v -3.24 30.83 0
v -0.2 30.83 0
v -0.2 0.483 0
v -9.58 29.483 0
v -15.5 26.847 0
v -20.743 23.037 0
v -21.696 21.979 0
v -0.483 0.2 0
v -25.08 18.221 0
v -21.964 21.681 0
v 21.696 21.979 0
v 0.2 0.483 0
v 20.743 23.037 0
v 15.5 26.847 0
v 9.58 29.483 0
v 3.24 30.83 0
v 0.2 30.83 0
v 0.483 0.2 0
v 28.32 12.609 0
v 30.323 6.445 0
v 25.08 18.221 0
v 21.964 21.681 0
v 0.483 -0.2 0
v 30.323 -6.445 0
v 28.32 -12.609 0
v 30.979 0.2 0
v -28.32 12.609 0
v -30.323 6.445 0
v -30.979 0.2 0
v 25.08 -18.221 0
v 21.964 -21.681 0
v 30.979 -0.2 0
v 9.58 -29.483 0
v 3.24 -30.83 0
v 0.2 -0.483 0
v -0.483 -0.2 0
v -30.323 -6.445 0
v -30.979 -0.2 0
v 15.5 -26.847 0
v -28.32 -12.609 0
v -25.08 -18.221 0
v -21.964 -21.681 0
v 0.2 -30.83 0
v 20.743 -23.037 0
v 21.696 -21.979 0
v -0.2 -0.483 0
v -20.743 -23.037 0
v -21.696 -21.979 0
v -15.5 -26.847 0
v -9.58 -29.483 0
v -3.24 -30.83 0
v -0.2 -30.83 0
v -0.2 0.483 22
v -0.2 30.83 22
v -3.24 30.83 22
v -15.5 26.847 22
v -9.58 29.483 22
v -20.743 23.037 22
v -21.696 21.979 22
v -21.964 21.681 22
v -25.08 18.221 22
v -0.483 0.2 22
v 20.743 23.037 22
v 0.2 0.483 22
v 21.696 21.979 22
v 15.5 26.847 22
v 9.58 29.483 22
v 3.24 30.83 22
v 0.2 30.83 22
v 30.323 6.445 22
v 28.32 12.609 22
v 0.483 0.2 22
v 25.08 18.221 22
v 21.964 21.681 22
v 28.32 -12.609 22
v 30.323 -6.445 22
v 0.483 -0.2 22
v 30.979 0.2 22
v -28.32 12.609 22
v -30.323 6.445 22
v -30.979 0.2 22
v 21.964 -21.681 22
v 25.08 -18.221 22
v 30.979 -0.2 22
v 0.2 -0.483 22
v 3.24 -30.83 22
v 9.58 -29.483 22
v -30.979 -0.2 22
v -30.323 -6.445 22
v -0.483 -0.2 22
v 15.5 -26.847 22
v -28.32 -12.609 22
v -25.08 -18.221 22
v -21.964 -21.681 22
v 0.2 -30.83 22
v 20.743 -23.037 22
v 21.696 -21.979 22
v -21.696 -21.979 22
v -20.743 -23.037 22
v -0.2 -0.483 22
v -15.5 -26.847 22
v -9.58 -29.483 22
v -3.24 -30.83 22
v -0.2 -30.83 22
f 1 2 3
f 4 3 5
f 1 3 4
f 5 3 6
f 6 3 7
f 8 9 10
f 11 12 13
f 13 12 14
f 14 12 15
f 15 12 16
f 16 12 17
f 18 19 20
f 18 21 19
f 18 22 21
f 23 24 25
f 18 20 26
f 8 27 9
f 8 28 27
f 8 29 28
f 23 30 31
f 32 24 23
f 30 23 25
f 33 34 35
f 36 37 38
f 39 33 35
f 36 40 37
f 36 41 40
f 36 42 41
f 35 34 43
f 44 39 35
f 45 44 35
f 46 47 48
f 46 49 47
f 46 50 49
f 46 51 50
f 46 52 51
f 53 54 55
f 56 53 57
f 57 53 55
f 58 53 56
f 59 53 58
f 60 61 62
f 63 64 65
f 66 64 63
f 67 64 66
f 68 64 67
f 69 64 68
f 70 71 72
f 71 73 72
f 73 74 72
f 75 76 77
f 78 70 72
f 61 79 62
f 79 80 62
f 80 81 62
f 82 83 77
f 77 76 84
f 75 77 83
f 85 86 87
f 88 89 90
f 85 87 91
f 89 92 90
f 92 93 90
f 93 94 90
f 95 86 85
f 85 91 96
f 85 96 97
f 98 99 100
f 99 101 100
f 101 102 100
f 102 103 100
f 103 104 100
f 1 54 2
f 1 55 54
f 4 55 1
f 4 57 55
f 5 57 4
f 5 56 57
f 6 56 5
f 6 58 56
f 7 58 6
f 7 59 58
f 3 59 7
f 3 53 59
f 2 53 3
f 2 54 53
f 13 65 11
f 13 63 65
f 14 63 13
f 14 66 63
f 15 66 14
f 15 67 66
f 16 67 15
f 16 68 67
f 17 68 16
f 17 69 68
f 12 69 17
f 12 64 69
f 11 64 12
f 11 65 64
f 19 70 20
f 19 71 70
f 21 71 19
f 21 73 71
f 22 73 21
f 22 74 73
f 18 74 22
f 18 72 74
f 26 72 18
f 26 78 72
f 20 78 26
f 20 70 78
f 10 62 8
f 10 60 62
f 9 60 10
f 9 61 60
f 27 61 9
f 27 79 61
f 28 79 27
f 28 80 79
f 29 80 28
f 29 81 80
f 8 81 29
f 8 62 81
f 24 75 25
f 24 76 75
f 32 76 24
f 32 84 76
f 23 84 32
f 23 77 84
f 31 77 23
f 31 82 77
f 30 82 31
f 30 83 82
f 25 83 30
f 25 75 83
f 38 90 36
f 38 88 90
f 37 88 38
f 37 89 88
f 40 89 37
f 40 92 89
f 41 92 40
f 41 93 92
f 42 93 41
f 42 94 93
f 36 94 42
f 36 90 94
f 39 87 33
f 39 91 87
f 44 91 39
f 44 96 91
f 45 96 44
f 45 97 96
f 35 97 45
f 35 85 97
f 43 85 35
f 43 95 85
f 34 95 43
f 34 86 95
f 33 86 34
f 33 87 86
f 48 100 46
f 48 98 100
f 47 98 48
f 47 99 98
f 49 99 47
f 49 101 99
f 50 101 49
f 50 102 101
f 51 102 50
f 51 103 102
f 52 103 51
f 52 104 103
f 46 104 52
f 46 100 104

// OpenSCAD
//Konfiguration
//Radius
    r = 31;
//Höhe des Kuchens
    h = 22;
//Anzahl der Stücke (gerade Zahl)
    n = 8;
    
module Schnitt (b = 0.4, l = 2*r+2)
    translate([0, 0, 0])
    for (i = [0:n-1]) {
        rotate(i*360/n)
        square([b, l], true);
    }

module Kuchen ()
    linear_extrude(height = h)
    difference(){
        circle(r, true);
        Schnitt();   
}

Kuchen ();
